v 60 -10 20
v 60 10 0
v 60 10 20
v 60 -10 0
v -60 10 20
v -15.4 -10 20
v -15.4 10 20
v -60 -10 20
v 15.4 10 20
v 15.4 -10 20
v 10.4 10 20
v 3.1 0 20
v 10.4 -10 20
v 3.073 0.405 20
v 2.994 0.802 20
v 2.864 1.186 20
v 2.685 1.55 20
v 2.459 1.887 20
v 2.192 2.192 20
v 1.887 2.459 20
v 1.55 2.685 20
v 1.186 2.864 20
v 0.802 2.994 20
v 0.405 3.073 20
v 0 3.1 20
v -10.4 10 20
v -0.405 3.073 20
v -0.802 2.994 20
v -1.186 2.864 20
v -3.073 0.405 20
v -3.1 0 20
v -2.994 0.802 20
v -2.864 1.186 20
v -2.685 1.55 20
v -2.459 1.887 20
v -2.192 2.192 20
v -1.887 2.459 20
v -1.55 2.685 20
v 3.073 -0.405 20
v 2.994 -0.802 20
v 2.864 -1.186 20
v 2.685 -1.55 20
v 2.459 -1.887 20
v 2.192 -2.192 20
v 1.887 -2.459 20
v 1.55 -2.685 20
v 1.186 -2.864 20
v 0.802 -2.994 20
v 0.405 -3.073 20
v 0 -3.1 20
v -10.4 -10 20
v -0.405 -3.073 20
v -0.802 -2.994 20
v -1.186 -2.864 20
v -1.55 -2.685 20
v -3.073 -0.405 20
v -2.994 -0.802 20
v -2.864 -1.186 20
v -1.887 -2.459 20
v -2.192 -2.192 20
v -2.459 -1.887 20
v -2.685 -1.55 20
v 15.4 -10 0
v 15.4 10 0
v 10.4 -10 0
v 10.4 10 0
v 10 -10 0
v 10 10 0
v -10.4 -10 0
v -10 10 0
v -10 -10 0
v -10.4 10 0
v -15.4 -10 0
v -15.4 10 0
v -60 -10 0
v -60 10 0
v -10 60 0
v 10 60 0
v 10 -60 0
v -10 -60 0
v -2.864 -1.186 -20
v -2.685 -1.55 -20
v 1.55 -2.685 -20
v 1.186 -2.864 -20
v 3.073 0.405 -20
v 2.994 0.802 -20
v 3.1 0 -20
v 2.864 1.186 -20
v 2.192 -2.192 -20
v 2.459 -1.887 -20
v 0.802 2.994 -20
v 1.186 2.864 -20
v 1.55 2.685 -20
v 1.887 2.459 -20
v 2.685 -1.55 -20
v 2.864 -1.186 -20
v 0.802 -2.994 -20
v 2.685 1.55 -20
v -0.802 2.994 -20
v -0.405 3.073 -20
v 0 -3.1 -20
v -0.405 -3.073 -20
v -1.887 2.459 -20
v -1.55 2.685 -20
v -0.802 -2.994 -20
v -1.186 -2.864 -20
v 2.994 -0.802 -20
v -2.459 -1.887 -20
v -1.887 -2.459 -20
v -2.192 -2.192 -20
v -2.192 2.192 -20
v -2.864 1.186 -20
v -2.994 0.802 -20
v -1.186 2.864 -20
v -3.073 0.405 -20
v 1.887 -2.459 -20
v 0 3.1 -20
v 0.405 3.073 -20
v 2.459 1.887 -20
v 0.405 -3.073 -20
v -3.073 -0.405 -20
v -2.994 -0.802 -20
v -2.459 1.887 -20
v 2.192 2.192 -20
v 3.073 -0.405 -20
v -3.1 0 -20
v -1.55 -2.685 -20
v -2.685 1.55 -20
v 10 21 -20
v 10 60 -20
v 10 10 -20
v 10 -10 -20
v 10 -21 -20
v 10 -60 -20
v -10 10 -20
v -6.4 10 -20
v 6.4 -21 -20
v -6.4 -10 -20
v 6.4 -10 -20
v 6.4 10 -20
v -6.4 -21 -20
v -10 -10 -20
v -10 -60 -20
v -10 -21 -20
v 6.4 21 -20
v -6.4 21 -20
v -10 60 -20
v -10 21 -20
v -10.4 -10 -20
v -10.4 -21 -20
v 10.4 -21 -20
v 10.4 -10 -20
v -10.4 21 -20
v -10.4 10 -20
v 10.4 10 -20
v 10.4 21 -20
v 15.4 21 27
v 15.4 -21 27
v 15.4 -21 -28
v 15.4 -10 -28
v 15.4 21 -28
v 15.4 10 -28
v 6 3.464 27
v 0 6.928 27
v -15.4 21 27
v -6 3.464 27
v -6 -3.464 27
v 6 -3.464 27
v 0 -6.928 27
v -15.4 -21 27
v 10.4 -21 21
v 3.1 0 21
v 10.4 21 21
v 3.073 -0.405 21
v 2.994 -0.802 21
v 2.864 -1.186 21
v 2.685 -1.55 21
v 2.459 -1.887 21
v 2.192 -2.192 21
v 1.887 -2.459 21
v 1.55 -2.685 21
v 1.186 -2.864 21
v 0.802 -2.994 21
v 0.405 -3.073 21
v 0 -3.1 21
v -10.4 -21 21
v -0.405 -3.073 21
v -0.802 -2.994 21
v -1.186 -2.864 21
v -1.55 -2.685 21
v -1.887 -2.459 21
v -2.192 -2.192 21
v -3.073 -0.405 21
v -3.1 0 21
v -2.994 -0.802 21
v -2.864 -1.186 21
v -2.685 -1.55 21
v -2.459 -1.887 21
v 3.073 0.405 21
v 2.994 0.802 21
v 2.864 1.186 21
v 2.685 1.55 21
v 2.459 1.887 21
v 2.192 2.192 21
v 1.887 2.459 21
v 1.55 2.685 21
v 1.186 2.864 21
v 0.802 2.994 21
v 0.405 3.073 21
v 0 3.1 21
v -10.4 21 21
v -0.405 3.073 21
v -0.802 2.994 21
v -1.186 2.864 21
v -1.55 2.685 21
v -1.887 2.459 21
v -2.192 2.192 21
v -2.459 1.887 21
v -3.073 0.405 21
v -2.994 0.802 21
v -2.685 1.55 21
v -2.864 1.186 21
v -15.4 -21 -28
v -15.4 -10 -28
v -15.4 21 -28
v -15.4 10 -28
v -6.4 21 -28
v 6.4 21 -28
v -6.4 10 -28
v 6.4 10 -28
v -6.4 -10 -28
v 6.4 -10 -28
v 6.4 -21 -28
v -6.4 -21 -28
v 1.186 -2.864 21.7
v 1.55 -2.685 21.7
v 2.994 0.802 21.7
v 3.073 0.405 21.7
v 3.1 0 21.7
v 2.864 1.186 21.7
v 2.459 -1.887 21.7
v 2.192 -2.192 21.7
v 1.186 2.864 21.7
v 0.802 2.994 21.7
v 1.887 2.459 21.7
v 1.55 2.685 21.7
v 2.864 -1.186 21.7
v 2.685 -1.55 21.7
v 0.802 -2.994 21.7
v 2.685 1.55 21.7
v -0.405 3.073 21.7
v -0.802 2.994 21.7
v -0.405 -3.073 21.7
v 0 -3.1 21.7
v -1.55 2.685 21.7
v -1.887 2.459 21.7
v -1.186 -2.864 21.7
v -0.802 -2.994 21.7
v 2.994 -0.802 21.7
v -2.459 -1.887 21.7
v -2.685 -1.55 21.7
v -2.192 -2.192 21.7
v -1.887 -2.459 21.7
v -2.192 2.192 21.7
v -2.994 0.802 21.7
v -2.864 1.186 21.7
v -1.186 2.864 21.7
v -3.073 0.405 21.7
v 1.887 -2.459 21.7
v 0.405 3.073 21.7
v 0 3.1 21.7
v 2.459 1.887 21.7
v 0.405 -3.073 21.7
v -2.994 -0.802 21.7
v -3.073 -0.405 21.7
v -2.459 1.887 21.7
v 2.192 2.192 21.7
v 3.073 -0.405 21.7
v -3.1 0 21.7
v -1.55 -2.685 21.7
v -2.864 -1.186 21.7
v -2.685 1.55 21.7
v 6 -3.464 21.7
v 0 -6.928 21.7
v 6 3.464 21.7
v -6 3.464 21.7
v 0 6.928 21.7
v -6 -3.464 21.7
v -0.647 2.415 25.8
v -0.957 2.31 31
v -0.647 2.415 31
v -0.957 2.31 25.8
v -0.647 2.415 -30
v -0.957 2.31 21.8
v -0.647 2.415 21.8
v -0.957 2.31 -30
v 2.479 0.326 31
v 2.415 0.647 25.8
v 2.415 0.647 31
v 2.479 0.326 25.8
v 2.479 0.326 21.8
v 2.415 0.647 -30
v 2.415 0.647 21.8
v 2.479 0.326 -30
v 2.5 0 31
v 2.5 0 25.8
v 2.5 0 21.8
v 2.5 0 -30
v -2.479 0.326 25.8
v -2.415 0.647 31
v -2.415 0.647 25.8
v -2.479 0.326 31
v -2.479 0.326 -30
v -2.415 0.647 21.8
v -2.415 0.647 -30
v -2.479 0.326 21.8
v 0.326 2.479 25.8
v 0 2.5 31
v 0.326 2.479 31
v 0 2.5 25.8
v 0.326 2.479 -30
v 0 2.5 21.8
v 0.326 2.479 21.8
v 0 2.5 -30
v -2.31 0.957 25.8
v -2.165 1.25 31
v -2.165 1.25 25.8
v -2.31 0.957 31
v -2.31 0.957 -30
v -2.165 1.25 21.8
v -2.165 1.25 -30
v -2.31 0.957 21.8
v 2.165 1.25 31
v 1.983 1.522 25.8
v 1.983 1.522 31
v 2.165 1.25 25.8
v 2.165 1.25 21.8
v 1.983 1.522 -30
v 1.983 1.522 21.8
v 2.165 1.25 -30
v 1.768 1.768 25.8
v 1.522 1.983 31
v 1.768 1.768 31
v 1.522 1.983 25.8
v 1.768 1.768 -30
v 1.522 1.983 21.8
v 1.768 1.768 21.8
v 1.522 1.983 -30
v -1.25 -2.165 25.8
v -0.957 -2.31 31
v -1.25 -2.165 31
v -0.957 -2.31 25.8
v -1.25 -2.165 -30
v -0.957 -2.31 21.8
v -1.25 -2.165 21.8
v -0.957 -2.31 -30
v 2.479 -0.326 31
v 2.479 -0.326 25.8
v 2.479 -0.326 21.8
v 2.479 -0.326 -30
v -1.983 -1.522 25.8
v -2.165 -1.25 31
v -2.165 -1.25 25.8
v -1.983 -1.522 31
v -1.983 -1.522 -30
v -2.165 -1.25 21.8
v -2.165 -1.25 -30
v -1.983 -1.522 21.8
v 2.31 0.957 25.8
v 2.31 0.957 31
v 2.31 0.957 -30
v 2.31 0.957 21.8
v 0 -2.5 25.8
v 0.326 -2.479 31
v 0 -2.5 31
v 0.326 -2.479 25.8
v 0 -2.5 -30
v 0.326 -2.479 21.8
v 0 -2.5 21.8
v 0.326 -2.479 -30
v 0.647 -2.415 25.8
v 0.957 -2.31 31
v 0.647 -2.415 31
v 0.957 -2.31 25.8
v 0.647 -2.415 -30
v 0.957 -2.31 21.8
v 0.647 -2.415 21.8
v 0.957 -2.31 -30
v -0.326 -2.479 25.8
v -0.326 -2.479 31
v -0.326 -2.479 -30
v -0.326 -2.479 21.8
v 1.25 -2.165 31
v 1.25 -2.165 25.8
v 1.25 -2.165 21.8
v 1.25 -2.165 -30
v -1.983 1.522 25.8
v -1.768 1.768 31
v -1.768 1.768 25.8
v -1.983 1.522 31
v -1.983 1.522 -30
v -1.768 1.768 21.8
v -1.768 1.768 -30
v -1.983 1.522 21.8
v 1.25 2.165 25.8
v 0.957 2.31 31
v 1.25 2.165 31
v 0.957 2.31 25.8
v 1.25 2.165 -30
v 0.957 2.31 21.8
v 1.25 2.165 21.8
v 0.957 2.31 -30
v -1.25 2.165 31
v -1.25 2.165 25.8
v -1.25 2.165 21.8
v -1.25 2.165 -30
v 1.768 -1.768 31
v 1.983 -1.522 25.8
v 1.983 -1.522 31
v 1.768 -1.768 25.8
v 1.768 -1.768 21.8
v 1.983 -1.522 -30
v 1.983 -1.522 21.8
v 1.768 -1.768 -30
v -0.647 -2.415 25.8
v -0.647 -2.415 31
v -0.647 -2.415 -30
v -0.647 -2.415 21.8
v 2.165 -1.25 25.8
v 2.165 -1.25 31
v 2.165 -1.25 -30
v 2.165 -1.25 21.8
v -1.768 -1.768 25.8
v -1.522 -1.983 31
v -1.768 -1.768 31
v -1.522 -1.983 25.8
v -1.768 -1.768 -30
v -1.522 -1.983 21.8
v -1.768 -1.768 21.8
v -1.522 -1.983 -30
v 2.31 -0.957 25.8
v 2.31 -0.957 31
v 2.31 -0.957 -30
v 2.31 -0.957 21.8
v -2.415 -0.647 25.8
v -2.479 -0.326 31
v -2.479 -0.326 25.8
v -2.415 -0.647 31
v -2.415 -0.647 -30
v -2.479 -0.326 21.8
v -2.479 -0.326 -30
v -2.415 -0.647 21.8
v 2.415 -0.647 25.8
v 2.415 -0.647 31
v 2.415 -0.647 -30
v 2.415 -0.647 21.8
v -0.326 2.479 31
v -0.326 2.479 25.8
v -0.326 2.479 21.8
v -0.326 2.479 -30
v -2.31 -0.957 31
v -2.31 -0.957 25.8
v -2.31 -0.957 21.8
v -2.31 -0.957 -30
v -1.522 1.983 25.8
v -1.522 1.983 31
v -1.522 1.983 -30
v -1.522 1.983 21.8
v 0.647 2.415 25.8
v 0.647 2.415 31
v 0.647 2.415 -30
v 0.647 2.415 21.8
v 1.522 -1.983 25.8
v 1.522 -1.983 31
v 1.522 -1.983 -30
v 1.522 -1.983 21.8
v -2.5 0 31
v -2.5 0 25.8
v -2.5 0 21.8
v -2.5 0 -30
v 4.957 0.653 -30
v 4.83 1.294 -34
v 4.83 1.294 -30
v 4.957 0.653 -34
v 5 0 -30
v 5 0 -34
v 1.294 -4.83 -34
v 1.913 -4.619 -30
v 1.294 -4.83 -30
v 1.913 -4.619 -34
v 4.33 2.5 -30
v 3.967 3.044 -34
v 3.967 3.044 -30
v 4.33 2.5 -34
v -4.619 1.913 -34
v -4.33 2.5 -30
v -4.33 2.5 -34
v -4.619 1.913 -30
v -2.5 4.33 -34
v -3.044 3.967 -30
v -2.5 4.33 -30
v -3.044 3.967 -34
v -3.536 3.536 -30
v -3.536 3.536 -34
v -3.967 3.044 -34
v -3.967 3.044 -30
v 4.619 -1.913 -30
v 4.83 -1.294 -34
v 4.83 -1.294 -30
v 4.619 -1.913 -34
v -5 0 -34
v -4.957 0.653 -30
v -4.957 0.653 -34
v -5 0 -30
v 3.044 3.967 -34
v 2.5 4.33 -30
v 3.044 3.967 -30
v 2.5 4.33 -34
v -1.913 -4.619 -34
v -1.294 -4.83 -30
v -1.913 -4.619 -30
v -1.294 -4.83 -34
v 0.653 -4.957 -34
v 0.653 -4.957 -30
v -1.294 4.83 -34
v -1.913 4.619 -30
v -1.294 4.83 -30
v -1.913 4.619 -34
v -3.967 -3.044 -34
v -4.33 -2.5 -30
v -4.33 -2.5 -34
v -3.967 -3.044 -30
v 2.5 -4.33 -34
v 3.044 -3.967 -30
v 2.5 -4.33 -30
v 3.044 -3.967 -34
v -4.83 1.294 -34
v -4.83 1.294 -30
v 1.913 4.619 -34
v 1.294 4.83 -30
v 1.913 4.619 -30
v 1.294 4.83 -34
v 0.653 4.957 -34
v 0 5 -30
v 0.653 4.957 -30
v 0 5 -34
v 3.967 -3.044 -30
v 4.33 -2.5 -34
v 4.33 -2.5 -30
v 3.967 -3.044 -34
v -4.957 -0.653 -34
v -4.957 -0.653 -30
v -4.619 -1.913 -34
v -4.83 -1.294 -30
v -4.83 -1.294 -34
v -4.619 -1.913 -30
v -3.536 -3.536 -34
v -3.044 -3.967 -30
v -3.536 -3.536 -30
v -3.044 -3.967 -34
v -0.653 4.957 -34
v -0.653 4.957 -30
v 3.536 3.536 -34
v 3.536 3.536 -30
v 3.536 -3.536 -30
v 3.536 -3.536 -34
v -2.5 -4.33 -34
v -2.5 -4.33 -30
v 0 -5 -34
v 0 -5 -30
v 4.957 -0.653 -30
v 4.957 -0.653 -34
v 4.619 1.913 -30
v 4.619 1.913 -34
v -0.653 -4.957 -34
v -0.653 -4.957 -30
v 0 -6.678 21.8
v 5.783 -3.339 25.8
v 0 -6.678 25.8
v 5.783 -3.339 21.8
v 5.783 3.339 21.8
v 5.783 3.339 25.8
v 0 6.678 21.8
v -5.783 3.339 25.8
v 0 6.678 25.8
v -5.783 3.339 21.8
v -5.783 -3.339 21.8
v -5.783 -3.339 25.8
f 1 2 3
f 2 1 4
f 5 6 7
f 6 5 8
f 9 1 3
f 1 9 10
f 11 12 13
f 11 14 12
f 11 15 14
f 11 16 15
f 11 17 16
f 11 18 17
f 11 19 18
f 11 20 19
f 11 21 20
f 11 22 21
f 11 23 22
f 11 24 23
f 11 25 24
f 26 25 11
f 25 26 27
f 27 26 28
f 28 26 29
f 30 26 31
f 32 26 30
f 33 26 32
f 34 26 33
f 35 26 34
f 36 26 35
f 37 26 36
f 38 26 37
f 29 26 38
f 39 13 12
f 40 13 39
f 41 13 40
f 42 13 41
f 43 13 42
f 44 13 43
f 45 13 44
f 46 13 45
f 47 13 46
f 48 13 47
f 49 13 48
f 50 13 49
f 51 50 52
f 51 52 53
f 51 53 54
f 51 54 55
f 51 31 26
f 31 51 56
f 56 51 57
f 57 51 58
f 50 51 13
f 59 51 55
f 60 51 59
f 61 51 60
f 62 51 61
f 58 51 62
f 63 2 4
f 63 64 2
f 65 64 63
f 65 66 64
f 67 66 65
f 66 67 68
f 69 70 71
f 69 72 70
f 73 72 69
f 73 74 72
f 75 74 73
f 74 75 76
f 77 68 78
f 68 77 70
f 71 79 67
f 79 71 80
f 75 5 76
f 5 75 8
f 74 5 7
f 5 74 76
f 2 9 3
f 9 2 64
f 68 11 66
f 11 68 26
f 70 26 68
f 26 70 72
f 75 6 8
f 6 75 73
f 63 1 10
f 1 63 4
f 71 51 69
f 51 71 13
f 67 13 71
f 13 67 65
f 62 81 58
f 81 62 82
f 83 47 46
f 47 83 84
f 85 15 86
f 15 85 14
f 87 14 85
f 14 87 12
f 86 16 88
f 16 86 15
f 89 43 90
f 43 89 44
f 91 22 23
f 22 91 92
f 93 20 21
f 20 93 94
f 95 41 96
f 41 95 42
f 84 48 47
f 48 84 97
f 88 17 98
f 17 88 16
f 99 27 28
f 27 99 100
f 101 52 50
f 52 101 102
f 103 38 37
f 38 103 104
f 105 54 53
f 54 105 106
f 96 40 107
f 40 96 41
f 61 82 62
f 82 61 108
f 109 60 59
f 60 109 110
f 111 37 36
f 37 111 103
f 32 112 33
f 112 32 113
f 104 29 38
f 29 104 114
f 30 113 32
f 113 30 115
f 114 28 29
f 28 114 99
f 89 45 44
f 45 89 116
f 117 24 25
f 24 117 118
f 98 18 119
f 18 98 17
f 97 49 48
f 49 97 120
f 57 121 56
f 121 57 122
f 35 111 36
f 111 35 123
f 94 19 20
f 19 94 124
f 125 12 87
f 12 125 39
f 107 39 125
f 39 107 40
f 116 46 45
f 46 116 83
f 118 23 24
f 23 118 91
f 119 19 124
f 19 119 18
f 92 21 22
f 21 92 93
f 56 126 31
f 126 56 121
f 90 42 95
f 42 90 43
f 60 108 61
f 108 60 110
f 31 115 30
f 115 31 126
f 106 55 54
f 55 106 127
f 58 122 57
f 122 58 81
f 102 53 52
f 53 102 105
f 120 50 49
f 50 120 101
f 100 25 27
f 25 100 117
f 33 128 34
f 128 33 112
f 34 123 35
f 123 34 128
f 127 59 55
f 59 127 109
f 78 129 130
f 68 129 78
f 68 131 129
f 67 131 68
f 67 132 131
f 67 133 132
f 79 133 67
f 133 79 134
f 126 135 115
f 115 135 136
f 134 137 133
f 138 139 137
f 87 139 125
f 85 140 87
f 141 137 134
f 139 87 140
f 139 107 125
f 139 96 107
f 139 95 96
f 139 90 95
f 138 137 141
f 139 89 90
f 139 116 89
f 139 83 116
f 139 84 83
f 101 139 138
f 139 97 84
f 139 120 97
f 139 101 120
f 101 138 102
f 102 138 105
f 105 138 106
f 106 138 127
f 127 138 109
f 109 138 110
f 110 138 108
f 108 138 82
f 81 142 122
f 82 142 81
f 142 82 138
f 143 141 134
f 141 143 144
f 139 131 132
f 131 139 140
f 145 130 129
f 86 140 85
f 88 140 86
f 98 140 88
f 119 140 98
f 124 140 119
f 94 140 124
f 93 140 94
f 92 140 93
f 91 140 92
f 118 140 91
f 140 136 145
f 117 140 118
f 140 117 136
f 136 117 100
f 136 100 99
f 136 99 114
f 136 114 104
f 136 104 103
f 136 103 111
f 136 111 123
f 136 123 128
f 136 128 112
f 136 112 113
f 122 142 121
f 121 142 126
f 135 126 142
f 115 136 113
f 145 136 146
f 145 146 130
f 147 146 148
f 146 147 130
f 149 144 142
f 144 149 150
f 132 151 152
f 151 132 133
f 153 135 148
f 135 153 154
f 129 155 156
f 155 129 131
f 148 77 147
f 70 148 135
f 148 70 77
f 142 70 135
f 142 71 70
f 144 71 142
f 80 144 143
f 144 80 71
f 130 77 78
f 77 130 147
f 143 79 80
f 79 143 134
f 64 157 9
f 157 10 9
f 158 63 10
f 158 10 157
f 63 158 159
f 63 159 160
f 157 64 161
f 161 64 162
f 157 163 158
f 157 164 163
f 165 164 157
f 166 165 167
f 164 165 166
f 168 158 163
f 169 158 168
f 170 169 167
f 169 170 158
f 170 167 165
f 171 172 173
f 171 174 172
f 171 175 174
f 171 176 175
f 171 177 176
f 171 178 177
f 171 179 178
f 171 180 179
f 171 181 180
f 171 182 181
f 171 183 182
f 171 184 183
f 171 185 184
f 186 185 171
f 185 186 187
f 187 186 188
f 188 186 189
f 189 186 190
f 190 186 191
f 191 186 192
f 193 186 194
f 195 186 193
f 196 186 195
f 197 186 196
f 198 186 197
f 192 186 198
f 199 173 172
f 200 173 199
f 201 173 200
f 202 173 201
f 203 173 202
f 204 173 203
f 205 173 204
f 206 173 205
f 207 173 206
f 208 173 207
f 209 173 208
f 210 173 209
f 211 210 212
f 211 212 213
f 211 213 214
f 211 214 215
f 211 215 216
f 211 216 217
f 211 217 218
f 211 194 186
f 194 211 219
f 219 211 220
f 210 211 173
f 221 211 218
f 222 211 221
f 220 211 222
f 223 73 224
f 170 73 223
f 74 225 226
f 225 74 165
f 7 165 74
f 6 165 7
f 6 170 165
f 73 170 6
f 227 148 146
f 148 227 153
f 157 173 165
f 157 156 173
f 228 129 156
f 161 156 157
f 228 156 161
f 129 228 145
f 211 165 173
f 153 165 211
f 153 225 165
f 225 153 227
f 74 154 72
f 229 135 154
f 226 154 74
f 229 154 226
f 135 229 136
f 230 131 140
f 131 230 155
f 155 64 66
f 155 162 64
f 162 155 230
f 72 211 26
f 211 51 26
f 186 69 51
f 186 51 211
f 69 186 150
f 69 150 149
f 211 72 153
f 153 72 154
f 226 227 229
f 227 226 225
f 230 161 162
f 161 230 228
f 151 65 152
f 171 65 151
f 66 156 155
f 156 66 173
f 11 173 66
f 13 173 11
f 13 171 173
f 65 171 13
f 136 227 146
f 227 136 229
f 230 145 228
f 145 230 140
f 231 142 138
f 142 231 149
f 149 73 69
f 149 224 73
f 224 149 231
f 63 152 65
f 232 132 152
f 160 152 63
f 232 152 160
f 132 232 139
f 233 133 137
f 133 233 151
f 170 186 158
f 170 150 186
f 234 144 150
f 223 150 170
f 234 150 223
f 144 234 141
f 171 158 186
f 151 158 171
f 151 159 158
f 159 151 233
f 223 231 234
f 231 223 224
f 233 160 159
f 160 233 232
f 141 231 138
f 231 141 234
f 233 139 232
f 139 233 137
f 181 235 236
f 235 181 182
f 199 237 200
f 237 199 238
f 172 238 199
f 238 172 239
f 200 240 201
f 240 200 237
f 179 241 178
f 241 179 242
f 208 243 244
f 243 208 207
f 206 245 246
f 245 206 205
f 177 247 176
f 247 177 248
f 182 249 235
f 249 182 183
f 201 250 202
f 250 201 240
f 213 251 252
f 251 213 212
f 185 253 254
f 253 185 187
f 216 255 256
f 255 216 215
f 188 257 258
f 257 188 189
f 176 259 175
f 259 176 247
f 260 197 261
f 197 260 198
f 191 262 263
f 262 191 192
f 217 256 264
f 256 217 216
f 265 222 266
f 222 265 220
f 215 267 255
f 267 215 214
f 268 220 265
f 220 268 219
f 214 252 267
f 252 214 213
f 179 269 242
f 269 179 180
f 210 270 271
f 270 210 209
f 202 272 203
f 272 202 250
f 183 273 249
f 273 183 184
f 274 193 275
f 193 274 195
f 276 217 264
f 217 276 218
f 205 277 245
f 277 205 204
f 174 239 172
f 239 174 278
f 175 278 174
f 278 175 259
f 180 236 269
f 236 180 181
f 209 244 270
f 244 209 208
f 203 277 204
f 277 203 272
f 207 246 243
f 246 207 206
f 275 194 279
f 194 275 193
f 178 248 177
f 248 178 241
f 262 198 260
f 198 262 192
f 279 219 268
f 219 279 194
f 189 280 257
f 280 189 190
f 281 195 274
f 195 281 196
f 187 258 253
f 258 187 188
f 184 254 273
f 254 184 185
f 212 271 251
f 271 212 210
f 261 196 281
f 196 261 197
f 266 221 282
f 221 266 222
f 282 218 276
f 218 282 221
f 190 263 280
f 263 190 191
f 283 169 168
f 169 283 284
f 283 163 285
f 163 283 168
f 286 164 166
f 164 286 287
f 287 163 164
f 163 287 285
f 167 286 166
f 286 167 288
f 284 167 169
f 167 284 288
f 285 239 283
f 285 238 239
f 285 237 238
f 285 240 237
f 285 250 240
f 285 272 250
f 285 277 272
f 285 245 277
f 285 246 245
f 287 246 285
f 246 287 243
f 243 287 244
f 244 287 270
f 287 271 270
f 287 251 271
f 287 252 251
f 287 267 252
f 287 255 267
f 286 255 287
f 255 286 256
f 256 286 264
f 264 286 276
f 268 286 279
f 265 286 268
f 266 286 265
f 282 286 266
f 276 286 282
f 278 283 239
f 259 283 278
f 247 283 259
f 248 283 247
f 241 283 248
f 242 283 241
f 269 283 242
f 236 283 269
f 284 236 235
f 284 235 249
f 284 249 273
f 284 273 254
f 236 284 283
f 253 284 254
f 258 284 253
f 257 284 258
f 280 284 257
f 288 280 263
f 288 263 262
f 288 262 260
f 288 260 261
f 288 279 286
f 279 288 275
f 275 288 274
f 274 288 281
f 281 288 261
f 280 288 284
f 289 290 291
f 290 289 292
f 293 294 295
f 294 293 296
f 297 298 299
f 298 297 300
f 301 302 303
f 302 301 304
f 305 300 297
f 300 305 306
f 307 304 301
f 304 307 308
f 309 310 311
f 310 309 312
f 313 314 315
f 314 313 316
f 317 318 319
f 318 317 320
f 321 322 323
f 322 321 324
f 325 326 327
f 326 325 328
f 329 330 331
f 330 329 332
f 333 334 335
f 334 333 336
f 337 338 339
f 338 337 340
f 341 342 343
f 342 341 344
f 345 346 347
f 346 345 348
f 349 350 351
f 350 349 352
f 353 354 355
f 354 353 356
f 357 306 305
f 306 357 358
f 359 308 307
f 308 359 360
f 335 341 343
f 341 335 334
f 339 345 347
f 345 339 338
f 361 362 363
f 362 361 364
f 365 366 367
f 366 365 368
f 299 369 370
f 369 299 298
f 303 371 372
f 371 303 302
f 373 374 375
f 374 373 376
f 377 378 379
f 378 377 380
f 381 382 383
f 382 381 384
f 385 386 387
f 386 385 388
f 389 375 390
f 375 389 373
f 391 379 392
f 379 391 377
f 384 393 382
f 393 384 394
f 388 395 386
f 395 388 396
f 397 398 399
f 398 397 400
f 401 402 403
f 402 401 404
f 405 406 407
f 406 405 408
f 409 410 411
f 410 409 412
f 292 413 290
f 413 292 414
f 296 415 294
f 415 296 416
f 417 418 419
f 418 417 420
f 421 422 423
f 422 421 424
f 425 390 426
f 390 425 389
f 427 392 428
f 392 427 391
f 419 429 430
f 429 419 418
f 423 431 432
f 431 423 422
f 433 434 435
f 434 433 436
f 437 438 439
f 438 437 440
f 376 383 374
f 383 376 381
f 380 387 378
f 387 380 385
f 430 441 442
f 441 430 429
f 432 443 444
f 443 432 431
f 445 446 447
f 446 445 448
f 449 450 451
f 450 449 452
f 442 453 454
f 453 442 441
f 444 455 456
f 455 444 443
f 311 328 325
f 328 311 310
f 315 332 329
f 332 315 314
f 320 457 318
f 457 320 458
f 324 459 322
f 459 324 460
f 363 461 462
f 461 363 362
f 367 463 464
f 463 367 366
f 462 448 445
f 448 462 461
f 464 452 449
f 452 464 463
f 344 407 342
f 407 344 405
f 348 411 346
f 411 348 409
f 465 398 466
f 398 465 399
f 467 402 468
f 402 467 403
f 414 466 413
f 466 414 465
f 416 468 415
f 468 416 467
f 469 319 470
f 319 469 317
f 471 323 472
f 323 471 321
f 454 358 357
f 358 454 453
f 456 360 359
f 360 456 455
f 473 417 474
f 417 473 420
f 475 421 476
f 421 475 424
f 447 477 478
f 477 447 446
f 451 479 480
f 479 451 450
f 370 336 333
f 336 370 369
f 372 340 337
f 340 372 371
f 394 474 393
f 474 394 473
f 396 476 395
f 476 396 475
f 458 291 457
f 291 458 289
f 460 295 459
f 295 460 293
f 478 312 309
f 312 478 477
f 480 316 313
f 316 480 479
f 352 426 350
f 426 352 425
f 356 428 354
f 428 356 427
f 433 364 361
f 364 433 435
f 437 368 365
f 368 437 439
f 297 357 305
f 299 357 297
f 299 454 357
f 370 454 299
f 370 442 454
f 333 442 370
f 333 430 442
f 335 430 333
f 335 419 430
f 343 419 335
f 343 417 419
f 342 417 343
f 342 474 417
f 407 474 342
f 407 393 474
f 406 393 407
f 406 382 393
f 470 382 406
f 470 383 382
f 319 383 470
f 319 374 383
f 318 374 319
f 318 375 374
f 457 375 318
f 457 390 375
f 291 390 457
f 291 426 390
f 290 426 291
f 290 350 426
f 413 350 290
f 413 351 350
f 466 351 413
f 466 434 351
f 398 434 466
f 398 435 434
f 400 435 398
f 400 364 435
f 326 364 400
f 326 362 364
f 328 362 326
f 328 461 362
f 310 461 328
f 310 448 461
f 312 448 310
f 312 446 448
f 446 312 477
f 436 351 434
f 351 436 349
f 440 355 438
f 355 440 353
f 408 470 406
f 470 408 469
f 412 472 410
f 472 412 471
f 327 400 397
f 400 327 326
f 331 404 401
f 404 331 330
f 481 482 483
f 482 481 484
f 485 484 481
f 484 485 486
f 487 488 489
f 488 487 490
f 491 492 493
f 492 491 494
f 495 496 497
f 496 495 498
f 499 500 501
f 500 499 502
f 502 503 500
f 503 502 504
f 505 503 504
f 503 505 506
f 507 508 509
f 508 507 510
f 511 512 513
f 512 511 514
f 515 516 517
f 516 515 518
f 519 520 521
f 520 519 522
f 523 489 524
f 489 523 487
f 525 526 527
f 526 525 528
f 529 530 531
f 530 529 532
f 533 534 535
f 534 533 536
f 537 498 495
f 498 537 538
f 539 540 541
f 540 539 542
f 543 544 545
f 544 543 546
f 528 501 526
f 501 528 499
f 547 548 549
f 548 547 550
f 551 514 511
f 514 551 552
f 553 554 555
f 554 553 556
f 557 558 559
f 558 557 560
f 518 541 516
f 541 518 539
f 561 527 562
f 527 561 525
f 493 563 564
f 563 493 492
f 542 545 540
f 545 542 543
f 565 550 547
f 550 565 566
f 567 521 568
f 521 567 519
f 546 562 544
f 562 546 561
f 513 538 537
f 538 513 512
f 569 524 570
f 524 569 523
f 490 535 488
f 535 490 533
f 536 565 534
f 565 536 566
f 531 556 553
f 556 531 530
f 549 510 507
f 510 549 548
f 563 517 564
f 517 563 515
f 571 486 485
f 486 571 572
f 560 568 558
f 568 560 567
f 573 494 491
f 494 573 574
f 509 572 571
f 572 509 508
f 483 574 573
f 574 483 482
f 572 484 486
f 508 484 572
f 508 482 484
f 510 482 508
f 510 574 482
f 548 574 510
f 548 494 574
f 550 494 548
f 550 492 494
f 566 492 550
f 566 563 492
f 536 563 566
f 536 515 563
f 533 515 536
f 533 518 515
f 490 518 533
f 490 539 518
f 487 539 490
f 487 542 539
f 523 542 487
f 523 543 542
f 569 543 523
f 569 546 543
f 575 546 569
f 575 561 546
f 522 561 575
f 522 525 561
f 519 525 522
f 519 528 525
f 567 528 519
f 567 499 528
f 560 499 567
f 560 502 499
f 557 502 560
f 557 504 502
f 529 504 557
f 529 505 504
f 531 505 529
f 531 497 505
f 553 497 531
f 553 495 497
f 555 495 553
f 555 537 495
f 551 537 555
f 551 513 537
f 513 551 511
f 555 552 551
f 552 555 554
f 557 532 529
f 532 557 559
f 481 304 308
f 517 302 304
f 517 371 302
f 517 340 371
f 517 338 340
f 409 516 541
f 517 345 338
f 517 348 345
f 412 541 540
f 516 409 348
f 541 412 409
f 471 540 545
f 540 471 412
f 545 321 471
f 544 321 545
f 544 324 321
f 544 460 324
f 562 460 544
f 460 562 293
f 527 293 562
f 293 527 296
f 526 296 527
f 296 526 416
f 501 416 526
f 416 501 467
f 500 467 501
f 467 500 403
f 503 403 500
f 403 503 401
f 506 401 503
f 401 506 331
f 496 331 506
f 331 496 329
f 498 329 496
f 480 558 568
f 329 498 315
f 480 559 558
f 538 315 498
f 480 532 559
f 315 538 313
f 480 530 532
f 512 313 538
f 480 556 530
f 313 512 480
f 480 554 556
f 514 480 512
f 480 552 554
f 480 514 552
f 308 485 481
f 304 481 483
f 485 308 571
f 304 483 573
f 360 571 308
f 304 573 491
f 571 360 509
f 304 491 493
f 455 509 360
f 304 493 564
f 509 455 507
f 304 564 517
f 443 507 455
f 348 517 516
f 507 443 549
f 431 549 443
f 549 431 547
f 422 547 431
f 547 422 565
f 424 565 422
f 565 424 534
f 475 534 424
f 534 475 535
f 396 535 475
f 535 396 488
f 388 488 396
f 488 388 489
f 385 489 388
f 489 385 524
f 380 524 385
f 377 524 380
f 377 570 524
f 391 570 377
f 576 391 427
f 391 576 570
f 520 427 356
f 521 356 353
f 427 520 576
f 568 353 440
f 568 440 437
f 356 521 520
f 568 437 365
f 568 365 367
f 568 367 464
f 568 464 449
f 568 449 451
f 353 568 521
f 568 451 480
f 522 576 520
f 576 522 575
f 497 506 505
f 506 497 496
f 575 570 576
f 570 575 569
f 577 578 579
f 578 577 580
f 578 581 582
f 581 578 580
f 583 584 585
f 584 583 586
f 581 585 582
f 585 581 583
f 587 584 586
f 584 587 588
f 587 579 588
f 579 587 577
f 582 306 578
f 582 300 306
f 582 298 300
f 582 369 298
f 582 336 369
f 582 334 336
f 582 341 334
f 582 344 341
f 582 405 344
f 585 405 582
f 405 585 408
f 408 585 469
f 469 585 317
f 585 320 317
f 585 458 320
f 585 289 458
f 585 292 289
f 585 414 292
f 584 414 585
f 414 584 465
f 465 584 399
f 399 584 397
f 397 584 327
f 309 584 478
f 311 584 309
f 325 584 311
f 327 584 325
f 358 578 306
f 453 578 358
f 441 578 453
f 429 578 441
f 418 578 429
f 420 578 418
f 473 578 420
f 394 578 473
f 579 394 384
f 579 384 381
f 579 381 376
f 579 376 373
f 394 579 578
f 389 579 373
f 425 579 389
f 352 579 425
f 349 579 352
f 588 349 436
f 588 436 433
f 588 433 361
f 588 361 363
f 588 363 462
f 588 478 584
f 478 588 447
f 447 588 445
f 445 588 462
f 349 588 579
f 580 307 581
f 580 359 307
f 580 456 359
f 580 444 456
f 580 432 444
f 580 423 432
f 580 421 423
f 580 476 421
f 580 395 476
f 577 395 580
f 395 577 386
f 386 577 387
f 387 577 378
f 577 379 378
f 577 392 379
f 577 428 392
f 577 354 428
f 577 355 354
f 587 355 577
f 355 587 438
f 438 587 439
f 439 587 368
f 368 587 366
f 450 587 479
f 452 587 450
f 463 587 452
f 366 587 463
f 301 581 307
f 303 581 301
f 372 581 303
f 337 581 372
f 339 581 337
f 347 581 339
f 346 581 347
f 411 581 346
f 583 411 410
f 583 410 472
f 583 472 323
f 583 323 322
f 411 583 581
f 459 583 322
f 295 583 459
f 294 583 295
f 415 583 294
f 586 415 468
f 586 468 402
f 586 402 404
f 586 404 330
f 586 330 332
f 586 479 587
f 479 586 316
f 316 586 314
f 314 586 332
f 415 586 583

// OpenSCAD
// Pingpang-SmartGear — one-piece double-U joint guard, v0.5
//
// Mechanical contract for this correction:
//   x = barrier long direction
//   y = front/back direction
//   z = vertical direction
//
// The printed part is ONE solid.  It contains a front U and a back U, joined
// by one printed top yoke.  The clear distance between the two U inner faces
// is exactly 20 mm.  There is no male/female printed connection and no second
// printed part to bolt together.
//
// The context tubes are the local joint envelope:
//   upper long 20x20 tube: axis x, z=0..20
//   lower perpendicular 20x20 tube: axis y, z=-20..0
// They touch at z=0 and share a vertical screw axis through their centre.

$fn = 48;

PART = "assembly_iso";

// ---------- fixed interface dimensions ----------
tube = 20;
u_inner_distance_y = 20;       // hard requirement: inner face to inner face
u_clearance_x = 0.8;           // only the x direction has initial PETG relief
u_inner_width_x = tube + u_clearance_x;
wall = 5.0;
u_outer_width_x = u_inner_width_x + 2 * wall;

front_y_inner = u_inner_distance_y / 2;
base_plate_depth_y = 7.0;
front_back_extension_y = 4.0;  // extend the complete U plate front-to-back
plate_depth_y = base_plate_depth_y + front_back_extension_y;
front_y_outer = front_y_inner + plate_depth_y;
back_y_outer = -front_y_outer;
back_y_inner = -front_y_inner;

u_bottom = -28;
u_top = 27;
top_yoke_thickness = 6.0;
hook_depth_x = 6.5;
hook_height_z = 8.0;
solid_upper_wall_bottom_z = 0.0; // solid side wall ends at the foot's upper edge

// Preview-only context: show the complete lower foot rather than a clipped
// 20 mm joint slice.  This does not change the printable part.
preview_foot_length_y = 120.0;

// Vertical screw relief.  This is a clearance hole, never a printed thread;
// the actual M4/M5 screw and nut/tapped tube remain external hardware.
screw_clearance_d = 6.2;

// Full top nut envelope.  The socket is intentionally larger than an M5 AF8
// nut and deeper than a typical 4 mm nut, so the nut cannot touch the top
// surface when the screw is tightened.
nut_pocket_af = 12.0;
nut_pocket_depth = 5.2;
nut_height = 4.0;

assert(u_inner_distance_y == 20, "双 U 内距离必须保持 20 mm");

// ---------- helpers ----------
module box_at(xc, yc, zc, sx, sy, sz) {
    translate([xc, yc, zc]) cube([sx, sy, sz], center = true);
}

module u_plate(y0, y1) {
    depth = y1 - y0;
    yc = (y0 + y1) / 2;
    left_x = -u_outer_width_x / 2 + wall / 2;
    right_x = u_outer_width_x / 2 - wall / 2;
    lip_z = u_bottom + hook_height_z / 2;
    left_lip_x = -u_outer_width_x / 2 + wall / 2 + hook_depth_x / 2;
    right_lip_x = u_outer_width_x / 2 - wall / 2 - hook_depth_x / 2;
    union() {
        // U top and two continuous arms.
        box_at(0, yc, u_top - top_yoke_thickness / 2,
               u_outer_width_x, depth, top_yoke_thickness);
        box_at(left_x, yc, (u_top + u_bottom) / 2,
               wall, depth, u_top - u_bottom);
        box_at(right_x, yc, (u_top + u_bottom) / 2,
               wall, depth, u_top - u_bottom);

        // Inward lower hooks: the actual anti-rotation retaining feature.
        box_at(left_lip_x, yc, lip_z,
               hook_depth_x, depth, hook_height_z);
        box_at(right_lip_x, yc, lip_z,
               hook_depth_x, depth, hook_height_z);

    }
}

module printed_yokes() {
    // The top yoke joins the top bridges of both U plates into one roof.
    // The lower mouths remain open so the front/back silhouettes stay U-shaped.
    box_at(0, 0, u_top - top_yoke_thickness / 2,
           u_outer_width_x, 2 * front_y_outer, top_yoke_thickness);
}

module solid_upper_side_walls() {
    // Above the foot, the left and right sides are continuous solid walls
    // through the full front/back depth.  The lower foot region remains open
    // except for the front/back U arms and inward retaining hooks.
    left_x = -u_outer_width_x / 2 + wall / 2;
    right_x = u_outer_width_x / 2 - wall / 2;
    wall_height = u_top - solid_upper_wall_bottom_z;

    box_at(left_x, 0, solid_upper_wall_bottom_z + wall_height / 2,
           wall, 2 * front_y_outer, wall_height);
    box_at(right_x, 0, solid_upper_wall_bottom_z + wall_height / 2,
           wall, 2 * front_y_outer, wall_height);
}

module vertical_screw_relief() {
    // Full z-axis clearance through the printed top yoke.  There is no printed
    // material in the middle gap, so this does not create a hidden horizontal
    // tunnel or a self-intersecting connector.  The screw approaches from
    // below, passes through the two tube sections, and exits this top yoke.
    translate([0, 0, (u_bottom + u_top) / 2])
        cylinder(d = screw_clearance_d,
                 h = (u_top - u_bottom) + 8,
                 center = true);

    // Hexagonal pocket opens from the top face.  Across-flats clearance is
    // deliberately generous; the remaining floor keeps the nut captured.
    translate([0, 0, u_top - nut_pocket_depth / 2])
        rotate([0, 0, 30])
            cylinder(r = nut_pocket_af / (2 * cos(30)),
                     h = nut_pocket_depth + 0.2,
                     center = true,
                     $fn = 6);
}

module double_u_clip() {
    difference() {
        union() {
            // Front U: inner face y=+10, outer face y=+21.
            u_plate(front_y_inner, front_y_outer);

            // Back U: inner face y=-10, outer face y=-21.
            u_plate(back_y_outer, back_y_inner);

            printed_yokes();
            solid_upper_side_walls();
        }
        vertical_screw_relief();
    }
}

// ---------- context envelope for preview only ----------
module vertical_bore() {
    translate([0, 0, 0])
        cylinder(d = screw_clearance_d, h = 60, center = true);
}

module upper_long_tube() {
    color([0.58, 0.61, 0.66])
        difference() {
            translate([0, 0, tube / 2])
                cube([120, tube, tube], center = true);
            vertical_bore();
        }
}

module lower_cross_tube() {
    // Preview the complete lower foot along y.  The printable interface still
    // uses the exact 20 mm gap between the two U inner faces.
    color([0.28, 0.45, 0.78])
        difference() {
            translate([0, 0, -tube / 2])
                cube([tube, preview_foot_length_y, tube], center = true);
            vertical_bore();
        }
}

module vertical_joint_screw() {
    color([0.82, 0.82, 0.84])
        translate([0, 0, 0])
            cylinder(d = 5.0, h = 62, center = true);

    // Screw head below the lower yoke.
    color([0.92, 0.70, 0.12])
        translate([0, 0, u_bottom - 4])
            cylinder(d = 10.0, h = 4.0, center = true);

    // The nut sits inside the recessed top pocket, below the top surface.
    color([0.92, 0.70, 0.12])
        translate([0, 0, u_top - nut_pocket_depth + nut_height / 2])
            rotate([0, 0, 30])
                cylinder(r = nut_pocket_af / (2 * cos(30)) - 0.25,
                         h = nut_height,
                         center = true,
                         $fn = 6);
}

module assembly_iso() {
    upper_long_tube();
    lower_cross_tube();
    color([0.96, 0.39, 0.08]) double_u_clip();
    vertical_joint_screw();
}

module assembly_section() {
    // Cut the positive-x half to expose the vertical hole and the 20 mm gap.
    intersection() {
        assembly_iso();
        translate([0, -100, -100]) cube([100, 200, 200]);
    }
}

module clip_front() {
    double_u_clip();
}

module clip_bottom() {
    double_u_clip();
}

module clip_top() {
    double_u_clip();
}

module clip_print_orientation() {
    // One-piece print orientation.  The y envelope is placed on z=0.
    translate([0, 0, front_y_outer])
        rotate([90, 0, 0]) double_u_clip();
}

if (PART == "clip") {
    double_u_clip();
} else if (PART == "clip_print_orientation") {
    clip_print_orientation();
} else if (PART == "assembly_section") {
    assembly_section();
} else if (PART == "clip_front") {
    clip_front();
} else if (PART == "clip_bottom") {
    clip_bottom();
} else if (PART == "clip_top") {
    clip_top();
} else {
    assembly_iso();
}
